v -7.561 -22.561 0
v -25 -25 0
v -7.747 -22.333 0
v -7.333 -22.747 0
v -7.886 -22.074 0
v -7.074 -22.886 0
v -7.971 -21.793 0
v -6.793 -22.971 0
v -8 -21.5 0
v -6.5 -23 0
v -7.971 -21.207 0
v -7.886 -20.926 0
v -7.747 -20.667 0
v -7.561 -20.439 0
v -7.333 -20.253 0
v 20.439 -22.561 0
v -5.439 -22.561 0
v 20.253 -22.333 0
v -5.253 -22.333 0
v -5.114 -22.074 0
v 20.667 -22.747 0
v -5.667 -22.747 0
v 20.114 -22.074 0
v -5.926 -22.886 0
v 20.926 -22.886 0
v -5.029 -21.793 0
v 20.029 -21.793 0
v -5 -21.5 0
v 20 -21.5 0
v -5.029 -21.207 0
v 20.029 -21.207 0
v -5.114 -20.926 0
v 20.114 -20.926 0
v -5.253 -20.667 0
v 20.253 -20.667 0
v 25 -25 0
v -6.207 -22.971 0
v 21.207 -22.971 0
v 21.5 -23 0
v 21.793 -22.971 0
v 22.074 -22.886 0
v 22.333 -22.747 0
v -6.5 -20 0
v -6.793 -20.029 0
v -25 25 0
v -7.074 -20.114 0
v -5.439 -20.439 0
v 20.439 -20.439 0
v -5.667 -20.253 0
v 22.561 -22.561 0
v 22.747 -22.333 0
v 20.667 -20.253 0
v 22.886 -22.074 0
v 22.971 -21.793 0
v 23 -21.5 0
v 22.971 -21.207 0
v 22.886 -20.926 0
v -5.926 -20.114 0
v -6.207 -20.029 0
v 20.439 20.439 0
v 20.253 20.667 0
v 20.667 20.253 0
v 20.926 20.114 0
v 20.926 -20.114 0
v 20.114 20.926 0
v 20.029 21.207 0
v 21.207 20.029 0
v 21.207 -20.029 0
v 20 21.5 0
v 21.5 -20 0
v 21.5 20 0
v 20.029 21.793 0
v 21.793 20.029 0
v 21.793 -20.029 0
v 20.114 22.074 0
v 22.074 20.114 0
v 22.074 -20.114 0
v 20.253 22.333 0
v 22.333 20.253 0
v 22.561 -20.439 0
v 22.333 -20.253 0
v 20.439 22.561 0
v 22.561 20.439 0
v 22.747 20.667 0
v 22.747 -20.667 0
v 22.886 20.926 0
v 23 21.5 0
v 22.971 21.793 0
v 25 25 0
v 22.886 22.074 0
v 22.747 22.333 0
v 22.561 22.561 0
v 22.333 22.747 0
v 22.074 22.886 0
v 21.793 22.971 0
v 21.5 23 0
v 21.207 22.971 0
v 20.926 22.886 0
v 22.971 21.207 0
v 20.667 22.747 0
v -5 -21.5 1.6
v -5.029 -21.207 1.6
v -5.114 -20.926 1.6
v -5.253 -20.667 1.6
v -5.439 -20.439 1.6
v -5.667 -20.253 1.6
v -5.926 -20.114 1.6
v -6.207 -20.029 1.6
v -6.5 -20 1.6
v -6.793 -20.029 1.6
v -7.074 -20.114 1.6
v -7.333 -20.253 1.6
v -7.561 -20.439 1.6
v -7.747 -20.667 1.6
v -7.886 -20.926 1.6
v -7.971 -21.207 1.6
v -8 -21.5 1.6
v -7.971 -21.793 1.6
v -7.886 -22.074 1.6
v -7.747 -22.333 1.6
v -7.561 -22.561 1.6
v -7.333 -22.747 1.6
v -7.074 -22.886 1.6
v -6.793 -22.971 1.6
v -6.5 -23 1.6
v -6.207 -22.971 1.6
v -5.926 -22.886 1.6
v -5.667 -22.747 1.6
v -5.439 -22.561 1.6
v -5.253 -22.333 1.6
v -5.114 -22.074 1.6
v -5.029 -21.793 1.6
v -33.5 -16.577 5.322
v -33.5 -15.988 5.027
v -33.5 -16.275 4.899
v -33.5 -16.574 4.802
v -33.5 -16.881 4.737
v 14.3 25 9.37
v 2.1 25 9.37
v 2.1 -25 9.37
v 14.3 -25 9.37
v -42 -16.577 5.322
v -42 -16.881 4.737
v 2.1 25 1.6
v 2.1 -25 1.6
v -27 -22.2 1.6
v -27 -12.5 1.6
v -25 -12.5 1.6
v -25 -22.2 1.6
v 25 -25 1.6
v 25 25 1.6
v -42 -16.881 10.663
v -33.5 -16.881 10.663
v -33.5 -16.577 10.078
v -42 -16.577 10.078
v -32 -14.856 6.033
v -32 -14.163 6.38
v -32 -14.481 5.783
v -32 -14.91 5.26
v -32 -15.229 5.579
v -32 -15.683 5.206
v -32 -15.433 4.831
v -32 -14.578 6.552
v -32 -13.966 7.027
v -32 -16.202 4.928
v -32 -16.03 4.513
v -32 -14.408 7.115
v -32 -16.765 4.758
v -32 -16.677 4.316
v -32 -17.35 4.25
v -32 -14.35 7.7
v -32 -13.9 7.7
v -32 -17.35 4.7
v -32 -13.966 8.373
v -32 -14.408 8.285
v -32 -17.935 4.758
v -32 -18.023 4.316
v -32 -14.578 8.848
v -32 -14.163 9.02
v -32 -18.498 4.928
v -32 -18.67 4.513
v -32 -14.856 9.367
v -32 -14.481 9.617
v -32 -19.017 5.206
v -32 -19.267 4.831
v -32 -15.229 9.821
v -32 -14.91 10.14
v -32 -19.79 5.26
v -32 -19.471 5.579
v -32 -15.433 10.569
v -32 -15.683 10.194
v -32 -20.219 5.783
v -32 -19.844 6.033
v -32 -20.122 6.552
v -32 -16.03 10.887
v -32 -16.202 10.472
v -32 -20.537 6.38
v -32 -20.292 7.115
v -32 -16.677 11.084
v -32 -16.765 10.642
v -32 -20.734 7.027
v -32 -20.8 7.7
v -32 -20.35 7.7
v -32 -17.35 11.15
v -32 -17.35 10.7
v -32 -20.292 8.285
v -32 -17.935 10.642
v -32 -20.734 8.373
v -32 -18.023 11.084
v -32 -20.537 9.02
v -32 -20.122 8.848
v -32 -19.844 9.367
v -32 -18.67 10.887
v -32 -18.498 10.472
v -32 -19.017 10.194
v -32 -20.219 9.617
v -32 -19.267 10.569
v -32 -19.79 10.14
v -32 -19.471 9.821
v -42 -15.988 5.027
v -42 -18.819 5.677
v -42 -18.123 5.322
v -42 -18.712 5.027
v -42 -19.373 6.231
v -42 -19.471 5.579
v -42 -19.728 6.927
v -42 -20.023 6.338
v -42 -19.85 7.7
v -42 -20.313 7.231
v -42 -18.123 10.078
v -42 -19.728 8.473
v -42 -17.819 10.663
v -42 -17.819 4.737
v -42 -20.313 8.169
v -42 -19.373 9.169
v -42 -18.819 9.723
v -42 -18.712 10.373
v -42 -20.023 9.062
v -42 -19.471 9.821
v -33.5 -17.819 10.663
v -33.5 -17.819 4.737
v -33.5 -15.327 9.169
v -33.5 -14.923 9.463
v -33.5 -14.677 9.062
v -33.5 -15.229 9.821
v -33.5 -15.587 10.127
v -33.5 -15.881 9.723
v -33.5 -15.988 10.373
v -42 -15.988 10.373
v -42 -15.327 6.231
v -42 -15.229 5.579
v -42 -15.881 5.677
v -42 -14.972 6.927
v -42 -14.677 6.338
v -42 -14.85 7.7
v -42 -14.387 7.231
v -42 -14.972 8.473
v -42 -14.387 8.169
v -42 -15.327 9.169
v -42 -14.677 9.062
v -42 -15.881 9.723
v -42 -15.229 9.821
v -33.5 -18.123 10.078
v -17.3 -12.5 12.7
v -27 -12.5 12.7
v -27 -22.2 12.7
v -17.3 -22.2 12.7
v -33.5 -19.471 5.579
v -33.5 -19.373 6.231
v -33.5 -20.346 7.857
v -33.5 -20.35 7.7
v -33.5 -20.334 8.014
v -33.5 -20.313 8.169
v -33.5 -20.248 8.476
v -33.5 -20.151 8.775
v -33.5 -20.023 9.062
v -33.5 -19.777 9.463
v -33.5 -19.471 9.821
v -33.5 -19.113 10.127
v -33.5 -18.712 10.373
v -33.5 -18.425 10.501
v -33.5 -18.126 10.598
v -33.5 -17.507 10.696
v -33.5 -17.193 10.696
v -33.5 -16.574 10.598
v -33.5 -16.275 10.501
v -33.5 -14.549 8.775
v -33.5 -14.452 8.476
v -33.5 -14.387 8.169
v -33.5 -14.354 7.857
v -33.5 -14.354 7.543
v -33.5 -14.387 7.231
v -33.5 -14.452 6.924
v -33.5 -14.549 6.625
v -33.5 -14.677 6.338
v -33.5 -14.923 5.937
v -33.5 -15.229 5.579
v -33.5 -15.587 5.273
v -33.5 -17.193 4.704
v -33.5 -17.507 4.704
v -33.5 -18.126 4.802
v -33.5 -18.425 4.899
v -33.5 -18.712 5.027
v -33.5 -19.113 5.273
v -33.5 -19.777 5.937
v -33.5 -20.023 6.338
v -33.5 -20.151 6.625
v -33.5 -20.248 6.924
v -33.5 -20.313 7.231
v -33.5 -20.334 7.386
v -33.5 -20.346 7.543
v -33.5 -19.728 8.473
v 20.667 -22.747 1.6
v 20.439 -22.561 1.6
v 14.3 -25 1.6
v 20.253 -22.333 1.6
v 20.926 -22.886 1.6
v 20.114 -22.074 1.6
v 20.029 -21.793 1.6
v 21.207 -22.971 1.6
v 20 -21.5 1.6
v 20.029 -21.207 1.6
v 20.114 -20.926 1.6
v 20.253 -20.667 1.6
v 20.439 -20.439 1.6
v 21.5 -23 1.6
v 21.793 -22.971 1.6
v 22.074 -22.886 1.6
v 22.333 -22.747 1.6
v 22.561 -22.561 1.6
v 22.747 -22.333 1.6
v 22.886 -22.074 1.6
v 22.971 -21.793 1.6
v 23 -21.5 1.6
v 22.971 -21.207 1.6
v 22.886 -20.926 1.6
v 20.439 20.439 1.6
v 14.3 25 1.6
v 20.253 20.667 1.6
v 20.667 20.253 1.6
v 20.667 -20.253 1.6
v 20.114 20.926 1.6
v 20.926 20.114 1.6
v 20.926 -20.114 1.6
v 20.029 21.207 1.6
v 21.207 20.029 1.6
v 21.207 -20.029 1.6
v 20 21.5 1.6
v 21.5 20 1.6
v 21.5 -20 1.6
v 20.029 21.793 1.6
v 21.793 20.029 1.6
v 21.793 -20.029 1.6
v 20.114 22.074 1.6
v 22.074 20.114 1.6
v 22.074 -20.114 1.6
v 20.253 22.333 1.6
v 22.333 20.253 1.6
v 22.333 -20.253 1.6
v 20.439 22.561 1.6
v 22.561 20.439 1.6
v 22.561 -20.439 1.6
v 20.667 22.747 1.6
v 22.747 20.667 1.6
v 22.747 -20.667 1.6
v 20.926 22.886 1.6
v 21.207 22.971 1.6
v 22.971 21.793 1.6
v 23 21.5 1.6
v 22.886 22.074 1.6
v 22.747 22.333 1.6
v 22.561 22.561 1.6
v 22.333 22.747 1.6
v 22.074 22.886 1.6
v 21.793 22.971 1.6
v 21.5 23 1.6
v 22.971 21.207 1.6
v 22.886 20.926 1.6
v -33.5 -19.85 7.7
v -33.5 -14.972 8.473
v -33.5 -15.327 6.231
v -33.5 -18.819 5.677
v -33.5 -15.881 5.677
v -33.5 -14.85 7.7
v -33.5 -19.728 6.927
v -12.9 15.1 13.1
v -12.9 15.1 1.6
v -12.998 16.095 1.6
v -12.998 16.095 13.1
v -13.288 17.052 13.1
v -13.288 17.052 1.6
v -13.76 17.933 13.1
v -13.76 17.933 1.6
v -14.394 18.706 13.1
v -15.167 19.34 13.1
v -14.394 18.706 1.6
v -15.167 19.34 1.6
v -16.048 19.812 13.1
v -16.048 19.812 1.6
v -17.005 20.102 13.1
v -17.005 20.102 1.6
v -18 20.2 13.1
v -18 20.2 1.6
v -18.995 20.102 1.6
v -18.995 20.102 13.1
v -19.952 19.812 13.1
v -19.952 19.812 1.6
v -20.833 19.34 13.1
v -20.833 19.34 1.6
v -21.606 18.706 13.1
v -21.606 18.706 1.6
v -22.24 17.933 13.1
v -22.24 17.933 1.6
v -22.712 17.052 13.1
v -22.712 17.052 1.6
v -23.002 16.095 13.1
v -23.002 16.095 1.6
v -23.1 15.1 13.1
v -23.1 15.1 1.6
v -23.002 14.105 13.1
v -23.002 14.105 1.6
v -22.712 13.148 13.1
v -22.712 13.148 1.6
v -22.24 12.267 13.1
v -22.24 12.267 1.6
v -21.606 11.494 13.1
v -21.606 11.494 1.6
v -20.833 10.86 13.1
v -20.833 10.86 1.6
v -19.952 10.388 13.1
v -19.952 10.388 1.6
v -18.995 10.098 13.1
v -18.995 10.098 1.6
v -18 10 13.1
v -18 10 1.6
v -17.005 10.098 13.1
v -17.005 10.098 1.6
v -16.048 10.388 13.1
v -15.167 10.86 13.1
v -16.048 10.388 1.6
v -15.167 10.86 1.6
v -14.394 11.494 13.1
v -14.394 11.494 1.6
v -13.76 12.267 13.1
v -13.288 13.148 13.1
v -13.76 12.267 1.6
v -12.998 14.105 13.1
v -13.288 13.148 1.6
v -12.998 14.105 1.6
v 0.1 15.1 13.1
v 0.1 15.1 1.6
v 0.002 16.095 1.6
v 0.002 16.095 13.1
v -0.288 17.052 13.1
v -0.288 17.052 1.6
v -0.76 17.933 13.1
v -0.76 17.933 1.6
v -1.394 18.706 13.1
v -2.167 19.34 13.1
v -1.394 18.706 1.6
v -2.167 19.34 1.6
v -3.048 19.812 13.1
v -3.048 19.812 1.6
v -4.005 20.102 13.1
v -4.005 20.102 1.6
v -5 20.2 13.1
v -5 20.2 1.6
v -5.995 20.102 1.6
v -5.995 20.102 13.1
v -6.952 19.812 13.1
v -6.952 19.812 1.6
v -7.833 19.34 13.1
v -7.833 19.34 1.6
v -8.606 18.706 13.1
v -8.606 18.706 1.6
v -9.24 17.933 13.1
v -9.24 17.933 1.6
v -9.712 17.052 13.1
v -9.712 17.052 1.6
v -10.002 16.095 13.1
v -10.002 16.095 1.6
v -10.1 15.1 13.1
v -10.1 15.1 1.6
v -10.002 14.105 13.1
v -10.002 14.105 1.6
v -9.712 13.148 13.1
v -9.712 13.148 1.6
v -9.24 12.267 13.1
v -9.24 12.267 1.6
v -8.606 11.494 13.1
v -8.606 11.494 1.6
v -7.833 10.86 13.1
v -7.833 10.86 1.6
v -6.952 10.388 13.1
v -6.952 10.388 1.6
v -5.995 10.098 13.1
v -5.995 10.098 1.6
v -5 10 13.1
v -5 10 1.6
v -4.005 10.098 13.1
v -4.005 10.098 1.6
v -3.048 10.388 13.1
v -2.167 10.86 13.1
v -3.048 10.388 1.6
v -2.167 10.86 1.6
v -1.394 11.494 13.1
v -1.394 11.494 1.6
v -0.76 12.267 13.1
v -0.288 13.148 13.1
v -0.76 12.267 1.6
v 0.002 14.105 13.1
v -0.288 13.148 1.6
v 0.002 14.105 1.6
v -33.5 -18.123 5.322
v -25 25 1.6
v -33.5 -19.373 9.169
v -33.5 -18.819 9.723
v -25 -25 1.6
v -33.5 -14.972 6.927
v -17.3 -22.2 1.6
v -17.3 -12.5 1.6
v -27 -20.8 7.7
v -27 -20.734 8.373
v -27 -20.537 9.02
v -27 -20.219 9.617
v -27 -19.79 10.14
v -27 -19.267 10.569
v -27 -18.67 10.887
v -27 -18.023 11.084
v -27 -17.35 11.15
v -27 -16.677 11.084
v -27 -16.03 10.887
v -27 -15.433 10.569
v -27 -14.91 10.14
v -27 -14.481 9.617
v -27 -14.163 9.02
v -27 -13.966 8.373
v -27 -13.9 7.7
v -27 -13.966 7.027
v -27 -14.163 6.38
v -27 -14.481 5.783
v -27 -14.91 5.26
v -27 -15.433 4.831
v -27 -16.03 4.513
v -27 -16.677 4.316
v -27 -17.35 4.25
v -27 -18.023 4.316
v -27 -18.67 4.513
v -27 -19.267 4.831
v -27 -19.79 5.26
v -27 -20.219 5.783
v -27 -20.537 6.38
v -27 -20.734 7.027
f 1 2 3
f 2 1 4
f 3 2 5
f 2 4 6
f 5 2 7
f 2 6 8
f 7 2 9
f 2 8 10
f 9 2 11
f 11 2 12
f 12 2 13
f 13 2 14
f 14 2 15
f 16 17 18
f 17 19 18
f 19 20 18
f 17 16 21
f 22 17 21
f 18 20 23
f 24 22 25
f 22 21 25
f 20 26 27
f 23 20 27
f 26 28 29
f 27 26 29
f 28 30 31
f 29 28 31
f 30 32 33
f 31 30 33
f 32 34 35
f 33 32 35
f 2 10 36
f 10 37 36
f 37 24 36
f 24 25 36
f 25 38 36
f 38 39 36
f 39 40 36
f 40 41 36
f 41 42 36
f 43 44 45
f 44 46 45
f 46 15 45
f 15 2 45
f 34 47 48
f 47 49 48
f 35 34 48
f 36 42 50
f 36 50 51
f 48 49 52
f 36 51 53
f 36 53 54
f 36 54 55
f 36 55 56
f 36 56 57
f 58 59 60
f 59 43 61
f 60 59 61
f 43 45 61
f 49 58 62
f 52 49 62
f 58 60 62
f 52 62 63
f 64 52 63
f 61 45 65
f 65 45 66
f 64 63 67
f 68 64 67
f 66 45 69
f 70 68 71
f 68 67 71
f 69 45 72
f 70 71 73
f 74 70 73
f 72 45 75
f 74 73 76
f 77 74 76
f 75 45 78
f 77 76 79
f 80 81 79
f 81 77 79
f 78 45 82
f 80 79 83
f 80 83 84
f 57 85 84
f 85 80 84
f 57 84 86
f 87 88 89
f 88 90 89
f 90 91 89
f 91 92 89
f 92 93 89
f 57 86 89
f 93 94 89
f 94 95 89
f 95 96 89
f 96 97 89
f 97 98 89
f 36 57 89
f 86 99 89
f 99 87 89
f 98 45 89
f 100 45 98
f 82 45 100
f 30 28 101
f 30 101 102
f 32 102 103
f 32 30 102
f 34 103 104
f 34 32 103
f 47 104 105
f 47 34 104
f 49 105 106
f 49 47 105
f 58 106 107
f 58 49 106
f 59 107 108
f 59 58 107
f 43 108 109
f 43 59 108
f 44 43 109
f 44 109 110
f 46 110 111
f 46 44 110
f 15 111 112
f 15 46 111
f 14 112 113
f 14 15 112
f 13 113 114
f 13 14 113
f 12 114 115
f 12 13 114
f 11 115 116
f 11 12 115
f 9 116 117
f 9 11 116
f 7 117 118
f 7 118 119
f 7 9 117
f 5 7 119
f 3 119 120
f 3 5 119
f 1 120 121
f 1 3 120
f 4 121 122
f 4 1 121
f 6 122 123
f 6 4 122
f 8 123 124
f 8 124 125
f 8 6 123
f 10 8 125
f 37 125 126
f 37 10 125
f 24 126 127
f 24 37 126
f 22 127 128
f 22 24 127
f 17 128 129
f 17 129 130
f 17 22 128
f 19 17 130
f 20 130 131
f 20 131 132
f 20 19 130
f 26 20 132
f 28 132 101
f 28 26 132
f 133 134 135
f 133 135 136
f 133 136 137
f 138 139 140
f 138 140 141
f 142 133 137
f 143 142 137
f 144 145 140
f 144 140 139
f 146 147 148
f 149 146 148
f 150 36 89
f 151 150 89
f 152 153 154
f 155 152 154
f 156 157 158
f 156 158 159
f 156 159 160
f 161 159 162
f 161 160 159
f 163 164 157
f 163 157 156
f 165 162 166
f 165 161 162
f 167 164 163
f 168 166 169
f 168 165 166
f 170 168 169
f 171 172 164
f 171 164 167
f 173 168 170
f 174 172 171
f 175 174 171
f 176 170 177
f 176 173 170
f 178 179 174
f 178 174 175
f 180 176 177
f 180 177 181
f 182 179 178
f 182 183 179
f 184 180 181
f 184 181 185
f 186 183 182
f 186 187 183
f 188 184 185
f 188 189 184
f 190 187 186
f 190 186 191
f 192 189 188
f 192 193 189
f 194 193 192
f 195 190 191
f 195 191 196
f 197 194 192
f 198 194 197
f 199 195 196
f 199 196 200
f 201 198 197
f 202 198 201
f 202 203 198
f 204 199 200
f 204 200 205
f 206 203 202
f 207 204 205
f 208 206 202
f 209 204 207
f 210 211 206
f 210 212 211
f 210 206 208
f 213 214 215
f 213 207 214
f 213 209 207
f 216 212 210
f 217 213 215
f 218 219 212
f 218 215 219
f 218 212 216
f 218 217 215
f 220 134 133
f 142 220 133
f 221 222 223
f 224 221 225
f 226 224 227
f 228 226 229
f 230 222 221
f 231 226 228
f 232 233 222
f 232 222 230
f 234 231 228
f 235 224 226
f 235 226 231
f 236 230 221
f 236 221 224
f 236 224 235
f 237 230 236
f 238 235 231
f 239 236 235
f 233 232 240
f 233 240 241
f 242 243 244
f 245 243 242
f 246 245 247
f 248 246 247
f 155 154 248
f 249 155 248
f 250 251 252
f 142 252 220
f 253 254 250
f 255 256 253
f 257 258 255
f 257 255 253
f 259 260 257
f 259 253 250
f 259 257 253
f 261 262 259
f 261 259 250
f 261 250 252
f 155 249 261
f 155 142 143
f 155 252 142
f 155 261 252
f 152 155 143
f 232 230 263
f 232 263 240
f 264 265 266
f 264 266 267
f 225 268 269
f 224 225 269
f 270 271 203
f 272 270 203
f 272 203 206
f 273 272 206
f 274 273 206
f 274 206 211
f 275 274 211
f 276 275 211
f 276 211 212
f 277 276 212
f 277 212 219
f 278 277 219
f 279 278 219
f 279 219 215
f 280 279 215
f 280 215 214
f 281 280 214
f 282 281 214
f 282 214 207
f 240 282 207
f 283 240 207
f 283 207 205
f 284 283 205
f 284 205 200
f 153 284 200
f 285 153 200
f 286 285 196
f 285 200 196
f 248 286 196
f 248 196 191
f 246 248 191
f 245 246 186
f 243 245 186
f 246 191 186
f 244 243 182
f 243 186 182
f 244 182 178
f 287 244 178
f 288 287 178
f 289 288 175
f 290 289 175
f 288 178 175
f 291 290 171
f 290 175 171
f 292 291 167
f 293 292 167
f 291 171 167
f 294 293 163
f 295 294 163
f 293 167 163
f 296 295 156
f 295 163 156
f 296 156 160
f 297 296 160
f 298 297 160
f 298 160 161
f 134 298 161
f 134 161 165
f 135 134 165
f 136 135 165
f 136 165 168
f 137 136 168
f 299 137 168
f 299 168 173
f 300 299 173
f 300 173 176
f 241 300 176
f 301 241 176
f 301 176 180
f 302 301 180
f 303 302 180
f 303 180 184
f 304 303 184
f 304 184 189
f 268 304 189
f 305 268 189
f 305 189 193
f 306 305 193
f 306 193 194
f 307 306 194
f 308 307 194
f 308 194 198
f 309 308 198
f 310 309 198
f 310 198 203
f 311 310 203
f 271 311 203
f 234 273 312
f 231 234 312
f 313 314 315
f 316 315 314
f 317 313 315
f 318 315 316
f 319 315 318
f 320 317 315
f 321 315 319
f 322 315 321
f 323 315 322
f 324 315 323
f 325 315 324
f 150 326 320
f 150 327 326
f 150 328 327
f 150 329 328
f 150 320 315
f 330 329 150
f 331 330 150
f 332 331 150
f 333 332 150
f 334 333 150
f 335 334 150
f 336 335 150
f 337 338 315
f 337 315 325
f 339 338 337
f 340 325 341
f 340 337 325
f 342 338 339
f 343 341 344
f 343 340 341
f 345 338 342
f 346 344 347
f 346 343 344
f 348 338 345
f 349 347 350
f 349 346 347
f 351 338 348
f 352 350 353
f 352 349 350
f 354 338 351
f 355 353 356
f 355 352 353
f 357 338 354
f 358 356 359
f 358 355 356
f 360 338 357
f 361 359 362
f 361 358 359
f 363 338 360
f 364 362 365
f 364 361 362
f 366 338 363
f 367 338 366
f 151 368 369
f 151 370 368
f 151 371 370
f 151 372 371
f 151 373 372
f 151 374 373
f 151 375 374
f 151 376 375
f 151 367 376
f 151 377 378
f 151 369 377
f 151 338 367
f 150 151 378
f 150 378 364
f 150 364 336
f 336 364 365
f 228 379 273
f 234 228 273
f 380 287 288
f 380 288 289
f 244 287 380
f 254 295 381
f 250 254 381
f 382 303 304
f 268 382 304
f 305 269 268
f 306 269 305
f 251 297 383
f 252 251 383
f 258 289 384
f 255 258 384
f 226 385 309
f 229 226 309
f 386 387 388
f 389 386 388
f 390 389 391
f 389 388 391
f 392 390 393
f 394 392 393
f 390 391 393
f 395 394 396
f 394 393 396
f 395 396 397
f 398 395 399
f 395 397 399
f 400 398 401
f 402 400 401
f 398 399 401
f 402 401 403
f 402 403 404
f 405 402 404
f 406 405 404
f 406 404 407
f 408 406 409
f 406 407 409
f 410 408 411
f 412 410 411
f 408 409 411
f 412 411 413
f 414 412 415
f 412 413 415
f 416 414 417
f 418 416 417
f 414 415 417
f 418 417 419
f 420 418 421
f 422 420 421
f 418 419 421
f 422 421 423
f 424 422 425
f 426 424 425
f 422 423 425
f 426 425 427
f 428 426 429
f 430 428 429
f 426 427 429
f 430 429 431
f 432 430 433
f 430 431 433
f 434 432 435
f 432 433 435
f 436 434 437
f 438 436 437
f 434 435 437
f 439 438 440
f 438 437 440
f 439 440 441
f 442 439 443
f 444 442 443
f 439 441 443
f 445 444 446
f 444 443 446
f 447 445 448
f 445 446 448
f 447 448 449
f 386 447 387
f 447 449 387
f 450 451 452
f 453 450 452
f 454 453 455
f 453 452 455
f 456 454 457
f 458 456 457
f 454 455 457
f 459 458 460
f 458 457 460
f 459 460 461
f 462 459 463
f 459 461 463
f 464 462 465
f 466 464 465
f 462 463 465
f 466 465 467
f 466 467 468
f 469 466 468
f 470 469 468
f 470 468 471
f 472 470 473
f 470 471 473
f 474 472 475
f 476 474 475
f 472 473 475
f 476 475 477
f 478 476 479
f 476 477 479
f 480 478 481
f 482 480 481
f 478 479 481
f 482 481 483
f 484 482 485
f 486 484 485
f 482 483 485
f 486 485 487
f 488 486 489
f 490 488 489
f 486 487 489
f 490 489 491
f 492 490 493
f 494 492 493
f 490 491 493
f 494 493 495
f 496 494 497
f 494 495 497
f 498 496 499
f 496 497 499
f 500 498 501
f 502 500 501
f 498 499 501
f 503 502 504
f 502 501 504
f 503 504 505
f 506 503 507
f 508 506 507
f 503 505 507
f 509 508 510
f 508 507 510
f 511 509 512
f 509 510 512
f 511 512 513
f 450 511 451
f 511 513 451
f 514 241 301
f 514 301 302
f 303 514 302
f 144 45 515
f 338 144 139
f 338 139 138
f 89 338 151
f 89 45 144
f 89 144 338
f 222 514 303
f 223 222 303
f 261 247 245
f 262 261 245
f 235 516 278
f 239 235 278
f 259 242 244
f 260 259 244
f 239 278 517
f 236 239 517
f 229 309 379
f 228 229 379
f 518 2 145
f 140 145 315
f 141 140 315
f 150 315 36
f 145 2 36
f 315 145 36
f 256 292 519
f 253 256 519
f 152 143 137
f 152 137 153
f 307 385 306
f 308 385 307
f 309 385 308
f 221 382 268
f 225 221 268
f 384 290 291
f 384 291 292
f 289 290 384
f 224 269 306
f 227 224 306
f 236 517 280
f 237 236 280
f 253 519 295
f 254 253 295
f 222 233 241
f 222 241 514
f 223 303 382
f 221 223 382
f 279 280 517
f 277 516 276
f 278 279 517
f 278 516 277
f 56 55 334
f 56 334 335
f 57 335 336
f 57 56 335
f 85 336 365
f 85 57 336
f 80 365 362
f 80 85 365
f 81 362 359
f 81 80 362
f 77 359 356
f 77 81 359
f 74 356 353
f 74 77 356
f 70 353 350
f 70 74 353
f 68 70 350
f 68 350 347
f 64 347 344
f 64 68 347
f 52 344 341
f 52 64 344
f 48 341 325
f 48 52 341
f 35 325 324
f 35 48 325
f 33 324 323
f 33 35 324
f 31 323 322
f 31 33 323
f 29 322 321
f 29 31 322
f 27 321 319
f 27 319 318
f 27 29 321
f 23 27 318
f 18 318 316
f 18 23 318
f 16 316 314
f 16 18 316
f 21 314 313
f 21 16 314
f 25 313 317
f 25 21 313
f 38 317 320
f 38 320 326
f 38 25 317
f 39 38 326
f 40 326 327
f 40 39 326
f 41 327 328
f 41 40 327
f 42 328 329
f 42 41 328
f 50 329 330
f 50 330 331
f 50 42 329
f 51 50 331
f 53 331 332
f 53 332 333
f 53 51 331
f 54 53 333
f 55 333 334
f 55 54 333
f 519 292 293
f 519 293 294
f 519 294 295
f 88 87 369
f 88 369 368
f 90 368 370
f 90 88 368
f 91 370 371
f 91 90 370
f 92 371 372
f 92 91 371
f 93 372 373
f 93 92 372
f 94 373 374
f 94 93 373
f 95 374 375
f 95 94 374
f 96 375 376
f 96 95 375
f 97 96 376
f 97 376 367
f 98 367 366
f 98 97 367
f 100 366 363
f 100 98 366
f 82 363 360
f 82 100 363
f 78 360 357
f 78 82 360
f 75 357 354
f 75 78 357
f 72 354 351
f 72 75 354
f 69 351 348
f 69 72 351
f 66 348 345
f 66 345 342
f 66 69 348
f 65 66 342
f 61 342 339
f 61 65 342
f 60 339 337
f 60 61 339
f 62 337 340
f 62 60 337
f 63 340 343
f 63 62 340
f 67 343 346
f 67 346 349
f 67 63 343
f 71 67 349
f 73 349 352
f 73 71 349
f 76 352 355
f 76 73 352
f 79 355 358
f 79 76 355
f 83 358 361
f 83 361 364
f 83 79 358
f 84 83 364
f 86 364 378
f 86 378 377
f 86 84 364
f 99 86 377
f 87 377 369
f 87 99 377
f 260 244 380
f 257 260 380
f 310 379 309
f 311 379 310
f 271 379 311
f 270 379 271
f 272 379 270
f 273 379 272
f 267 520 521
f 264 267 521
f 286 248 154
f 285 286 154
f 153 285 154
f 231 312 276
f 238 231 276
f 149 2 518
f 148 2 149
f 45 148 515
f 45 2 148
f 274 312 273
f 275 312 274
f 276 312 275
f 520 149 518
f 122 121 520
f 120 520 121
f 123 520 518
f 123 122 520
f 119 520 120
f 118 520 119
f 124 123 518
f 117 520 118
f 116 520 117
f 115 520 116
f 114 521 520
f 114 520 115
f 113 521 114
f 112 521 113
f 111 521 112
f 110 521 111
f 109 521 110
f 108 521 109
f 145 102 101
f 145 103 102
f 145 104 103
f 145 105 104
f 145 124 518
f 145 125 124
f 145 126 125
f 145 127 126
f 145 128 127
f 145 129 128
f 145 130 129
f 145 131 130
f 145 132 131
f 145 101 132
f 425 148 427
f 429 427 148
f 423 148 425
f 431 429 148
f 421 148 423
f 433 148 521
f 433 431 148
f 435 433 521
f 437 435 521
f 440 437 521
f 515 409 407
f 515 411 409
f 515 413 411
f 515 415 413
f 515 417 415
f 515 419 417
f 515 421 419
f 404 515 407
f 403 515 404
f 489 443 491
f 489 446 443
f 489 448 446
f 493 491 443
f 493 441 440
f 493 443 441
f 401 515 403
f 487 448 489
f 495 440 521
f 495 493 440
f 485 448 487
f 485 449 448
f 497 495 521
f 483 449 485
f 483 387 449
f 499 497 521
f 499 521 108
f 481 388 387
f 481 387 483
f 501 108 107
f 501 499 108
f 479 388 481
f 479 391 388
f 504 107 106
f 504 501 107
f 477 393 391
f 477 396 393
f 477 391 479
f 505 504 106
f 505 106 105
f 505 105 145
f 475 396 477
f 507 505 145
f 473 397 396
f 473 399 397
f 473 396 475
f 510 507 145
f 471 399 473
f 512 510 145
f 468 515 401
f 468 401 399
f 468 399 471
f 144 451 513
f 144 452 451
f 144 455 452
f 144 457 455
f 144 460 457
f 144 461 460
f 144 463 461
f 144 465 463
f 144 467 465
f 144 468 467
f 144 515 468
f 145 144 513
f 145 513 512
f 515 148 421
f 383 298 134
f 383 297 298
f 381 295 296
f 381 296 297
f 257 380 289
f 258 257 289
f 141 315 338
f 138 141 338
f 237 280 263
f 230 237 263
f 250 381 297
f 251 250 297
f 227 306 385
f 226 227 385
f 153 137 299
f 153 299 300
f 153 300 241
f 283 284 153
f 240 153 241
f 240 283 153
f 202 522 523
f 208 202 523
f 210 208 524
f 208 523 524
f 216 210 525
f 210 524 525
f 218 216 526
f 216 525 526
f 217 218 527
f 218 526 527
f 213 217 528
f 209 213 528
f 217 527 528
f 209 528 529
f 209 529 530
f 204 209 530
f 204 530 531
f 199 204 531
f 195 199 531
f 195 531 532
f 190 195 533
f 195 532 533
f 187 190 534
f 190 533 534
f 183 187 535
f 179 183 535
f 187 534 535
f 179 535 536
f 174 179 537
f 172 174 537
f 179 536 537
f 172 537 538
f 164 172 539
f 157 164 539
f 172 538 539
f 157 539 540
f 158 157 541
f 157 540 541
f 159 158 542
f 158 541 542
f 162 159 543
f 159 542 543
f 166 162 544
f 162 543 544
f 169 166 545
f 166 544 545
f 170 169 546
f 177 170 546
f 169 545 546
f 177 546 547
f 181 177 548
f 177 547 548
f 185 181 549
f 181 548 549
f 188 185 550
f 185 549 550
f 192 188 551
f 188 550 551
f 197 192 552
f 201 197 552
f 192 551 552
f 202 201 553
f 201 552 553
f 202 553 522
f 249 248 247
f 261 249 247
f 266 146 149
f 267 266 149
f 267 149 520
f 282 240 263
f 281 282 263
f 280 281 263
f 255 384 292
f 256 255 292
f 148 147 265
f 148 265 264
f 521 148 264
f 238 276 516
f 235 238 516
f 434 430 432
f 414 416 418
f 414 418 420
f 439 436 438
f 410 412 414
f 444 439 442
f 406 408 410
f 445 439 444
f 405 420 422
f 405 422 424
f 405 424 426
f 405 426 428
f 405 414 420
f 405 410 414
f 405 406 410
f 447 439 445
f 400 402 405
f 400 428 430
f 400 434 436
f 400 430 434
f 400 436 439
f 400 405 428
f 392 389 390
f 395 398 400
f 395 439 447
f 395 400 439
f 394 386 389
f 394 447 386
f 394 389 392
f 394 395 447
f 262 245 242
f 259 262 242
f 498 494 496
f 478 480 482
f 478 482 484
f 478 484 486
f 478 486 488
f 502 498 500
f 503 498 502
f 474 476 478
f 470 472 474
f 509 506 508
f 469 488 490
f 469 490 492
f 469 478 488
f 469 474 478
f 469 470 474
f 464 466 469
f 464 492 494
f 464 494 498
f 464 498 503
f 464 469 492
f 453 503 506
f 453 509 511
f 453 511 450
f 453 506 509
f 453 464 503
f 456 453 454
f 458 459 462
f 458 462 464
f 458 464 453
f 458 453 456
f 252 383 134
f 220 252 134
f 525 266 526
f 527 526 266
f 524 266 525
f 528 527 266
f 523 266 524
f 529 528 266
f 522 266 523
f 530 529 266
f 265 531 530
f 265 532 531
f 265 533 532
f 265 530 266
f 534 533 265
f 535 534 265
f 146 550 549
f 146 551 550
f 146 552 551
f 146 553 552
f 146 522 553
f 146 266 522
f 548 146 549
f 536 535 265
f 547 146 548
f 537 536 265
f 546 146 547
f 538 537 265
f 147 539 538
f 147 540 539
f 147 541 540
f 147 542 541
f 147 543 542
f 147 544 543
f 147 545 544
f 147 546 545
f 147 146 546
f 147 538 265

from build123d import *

# Parameters (mm, degrees)
F0_W      = 50
F0_H      = 50
F0_R      = 1.5
F1_DEPTH  = 1.6
F2_W      = 12.2
F2_H      = 50
F3_DEPTH  = 7.77
F4_R      = 5.1
F5_DEPTH  = 11.5
F6_W      = 9.7
F6_H      = 9.7
F7_DEPTH  = 11.1
F8_R      = 3.45
F9_DEPTH  = 5
F10_R     = 3
F11_DEPTH = 1.5
F13_DEPTH = 8.5


with BuildPart() as f1:
    # F0 (on Top) → F1 (new body)
    with BuildSketch(Plane.XY):
        Rectangle(F0_W, F0_H)
        with Locations((-6.5, -21.5)):
            Circle(F0_R, mode=Mode.SUBTRACT)
        with Locations((21.5, -21.5)):
            Circle(F0_R, mode=Mode.SUBTRACT)
        with Locations((21.5, 21.5)):
            Circle(F0_R, mode=Mode.SUBTRACT)
    extrude(amount=F1_DEPTH)

    # F2 (on face) → F3 (join)
    with BuildSketch(Plane.XY.offset(1.6)):
        with Locations((8.2, 0)):
            Rectangle(F2_W, F2_H)
    extrude(amount=F3_DEPTH)

    # F4 (on face) → F5 (join)
    with BuildSketch(Plane.XY.offset(1.6)):
        with Locations((-18, 15.1)):
            Circle(F4_R)
        with Locations((-5, 15.1)):
            Circle(F4_R)
    extrude(amount=F5_DEPTH)

    # F6 (on face) → F7 (join)
    with BuildSketch(Plane.XY.offset(1.6)):
        with Locations((-22.15, -17.35)):
            Rectangle(F6_W, F6_H)
    extrude(amount=F7_DEPTH)

    # F8 (on face) → F9 (join)
    with BuildSketch(Plane(origin=(-27, 0, 0), x_dir=(0, -1, 0), z_dir=(-1, 0, 0))):
        with Locations((17.35, 7.7)):
            Circle(F8_R)
    extrude(amount=F9_DEPTH)

    # F10 (on face) → F11 (join)
    with BuildSketch(Plane(origin=(-32, 0, 0), x_dir=(0, -1, 0), z_dir=(-1, 0, 0))):
        with Locations((17.35, 7.7)):
            Circle(F10_R)
    extrude(amount=F11_DEPTH)

    # F12 (on face) → F13 (join)
    with BuildSketch(Plane(origin=(-33.5, 0, 0), x_dir=(0, -1, 0), z_dir=(-1, 0, 0))):
        Polygon((16.880697, 4.736935), (16.880697, 10.663065), (16.577458, 10.077641), (15.988029, 10.37302), (15.880537, 9.722542), (15.22868, 9.82132), (15.327458, 9.169463), (14.67698, 9.061971), (14.972359, 8.472542), (14.386935, 8.169303), (14.85, 7.7), (14.386935, 7.230697), (14.972359, 6.927458), (14.67698, 6.338029), (15.327458, 6.230537), (15.22868, 5.57868), (15.880537, 5.677458), (15.988029, 5.02698), (16.577458, 5.322359), align=None)
        Polygon((18.122542, 10.077641), (17.819303, 10.663065), (17.819303, 4.736935), (18.122542, 5.322359), (18.711971, 5.02698), (18.819463, 5.677458), (19.47132, 5.57868), (19.372542, 6.230537), (20.02302, 6.338029), (19.727641, 6.927458), (20.313065, 7.230697), (19.85, 7.7), (20.313065, 8.169303), (19.727641, 8.472542), (20.02302, 9.061971), (19.372542, 9.169463), (19.47132, 9.82132), (18.819463, 9.722542), (18.711971, 10.37302), align=None)
    extrude(amount=F13_DEPTH)


solid = f1.part
